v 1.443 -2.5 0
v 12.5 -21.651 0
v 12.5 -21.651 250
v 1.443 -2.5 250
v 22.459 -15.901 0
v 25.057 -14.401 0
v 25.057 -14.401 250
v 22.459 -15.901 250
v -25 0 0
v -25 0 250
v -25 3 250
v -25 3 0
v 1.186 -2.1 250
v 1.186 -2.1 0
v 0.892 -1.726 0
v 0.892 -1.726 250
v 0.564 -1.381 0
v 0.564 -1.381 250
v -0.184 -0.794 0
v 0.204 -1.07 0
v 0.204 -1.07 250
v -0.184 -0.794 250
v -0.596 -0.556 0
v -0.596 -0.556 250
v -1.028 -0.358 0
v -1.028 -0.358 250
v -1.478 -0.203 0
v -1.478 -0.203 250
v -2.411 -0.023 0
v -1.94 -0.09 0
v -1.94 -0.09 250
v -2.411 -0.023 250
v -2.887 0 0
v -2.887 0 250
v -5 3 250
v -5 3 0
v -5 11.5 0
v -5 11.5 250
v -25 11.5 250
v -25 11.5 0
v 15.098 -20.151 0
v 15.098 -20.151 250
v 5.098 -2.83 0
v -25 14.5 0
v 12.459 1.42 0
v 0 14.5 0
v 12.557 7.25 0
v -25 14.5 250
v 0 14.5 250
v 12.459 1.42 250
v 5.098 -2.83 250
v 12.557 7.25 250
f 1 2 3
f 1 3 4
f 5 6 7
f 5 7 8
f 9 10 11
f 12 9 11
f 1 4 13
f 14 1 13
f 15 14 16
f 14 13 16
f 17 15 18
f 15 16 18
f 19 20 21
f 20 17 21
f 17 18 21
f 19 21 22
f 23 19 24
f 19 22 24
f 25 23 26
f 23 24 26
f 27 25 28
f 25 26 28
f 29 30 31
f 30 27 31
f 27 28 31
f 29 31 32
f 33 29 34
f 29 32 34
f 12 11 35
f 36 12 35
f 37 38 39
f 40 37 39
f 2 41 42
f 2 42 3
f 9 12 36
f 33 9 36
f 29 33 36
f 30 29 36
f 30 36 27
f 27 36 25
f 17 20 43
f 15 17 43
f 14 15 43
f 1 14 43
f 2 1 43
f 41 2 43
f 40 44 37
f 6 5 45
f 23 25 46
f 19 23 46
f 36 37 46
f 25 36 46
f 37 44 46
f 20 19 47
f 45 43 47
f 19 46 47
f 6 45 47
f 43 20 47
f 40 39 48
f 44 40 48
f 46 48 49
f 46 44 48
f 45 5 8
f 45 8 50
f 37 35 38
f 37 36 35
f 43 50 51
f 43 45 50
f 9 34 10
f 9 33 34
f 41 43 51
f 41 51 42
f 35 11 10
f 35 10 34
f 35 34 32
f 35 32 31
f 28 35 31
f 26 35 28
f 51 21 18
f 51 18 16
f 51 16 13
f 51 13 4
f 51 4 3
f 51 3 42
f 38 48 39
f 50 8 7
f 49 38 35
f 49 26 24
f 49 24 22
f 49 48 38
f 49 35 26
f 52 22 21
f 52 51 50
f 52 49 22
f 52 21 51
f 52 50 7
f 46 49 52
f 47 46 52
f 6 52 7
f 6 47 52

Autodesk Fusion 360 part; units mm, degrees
sketch "Schizzo1" plane through (0, 0, 0) normal (0, 0, 1) x (1, 0, 0)
  line L0 (0, 0) -> (-25, 0)
  line L1 (-25, 0) -> (-25, 3)
  line L2 (-25, 3) -> (-5, 3)
  line L3 (-5, 3) -> (-5, 11.5)
  line L4 (-5, 11.5) -> (-25, 11.5)
  line L5 (-25, 11.5) -> (-25, 14.5)
  line L6 (-25, 14.5) -> (0, 14.5)
  line L7 (0, 14.5) -> (0, 0)
  line L8 (12.5574, 7.25) -> (25.0574, -14.4006)
  line L9 (12.4593, 1.4199) -> (5.0981, -2.8301)
  line L10 (0, 0) -> (12.5574, 7.25)
  line L11 (12.5, -21.6506) -> (0, 0)
  line L12 (5.0981, -2.8301) -> (15.0981, -20.1506)
  line L13 (25.0574, -14.4006) -> (22.4593, -15.9006)
  line L14 (15.0981, -20.1506) -> (12.5, -21.6506)
  line L15 (22.4593, -15.9006) -> (12.4593, 1.4199)
  line L16 (0, 14.5) -> (12.5574, 7.25)
  point P0 (12.5574, 7.25)
  dimension "d2" = 8.5
  dimension "d3" = 3
  dimension "d4" = 3
  dimension "d5" = 25
  dimension "d6" = 25
  dimension "d7" = 20
  dimension "d8" = 8.5
  dimension "d9" = 3
  dimension "d10" = 3
  dimension "d11" = 25
  dimension "d12" = 25
  dimension "d13" = 20
  dimension "d16" = 60
extrude "Estrusione1" add sketch "Schizzo1" along normal blind 250
fillet "Raccordo1" radius 5 1 edges at (0, 0, 125)
